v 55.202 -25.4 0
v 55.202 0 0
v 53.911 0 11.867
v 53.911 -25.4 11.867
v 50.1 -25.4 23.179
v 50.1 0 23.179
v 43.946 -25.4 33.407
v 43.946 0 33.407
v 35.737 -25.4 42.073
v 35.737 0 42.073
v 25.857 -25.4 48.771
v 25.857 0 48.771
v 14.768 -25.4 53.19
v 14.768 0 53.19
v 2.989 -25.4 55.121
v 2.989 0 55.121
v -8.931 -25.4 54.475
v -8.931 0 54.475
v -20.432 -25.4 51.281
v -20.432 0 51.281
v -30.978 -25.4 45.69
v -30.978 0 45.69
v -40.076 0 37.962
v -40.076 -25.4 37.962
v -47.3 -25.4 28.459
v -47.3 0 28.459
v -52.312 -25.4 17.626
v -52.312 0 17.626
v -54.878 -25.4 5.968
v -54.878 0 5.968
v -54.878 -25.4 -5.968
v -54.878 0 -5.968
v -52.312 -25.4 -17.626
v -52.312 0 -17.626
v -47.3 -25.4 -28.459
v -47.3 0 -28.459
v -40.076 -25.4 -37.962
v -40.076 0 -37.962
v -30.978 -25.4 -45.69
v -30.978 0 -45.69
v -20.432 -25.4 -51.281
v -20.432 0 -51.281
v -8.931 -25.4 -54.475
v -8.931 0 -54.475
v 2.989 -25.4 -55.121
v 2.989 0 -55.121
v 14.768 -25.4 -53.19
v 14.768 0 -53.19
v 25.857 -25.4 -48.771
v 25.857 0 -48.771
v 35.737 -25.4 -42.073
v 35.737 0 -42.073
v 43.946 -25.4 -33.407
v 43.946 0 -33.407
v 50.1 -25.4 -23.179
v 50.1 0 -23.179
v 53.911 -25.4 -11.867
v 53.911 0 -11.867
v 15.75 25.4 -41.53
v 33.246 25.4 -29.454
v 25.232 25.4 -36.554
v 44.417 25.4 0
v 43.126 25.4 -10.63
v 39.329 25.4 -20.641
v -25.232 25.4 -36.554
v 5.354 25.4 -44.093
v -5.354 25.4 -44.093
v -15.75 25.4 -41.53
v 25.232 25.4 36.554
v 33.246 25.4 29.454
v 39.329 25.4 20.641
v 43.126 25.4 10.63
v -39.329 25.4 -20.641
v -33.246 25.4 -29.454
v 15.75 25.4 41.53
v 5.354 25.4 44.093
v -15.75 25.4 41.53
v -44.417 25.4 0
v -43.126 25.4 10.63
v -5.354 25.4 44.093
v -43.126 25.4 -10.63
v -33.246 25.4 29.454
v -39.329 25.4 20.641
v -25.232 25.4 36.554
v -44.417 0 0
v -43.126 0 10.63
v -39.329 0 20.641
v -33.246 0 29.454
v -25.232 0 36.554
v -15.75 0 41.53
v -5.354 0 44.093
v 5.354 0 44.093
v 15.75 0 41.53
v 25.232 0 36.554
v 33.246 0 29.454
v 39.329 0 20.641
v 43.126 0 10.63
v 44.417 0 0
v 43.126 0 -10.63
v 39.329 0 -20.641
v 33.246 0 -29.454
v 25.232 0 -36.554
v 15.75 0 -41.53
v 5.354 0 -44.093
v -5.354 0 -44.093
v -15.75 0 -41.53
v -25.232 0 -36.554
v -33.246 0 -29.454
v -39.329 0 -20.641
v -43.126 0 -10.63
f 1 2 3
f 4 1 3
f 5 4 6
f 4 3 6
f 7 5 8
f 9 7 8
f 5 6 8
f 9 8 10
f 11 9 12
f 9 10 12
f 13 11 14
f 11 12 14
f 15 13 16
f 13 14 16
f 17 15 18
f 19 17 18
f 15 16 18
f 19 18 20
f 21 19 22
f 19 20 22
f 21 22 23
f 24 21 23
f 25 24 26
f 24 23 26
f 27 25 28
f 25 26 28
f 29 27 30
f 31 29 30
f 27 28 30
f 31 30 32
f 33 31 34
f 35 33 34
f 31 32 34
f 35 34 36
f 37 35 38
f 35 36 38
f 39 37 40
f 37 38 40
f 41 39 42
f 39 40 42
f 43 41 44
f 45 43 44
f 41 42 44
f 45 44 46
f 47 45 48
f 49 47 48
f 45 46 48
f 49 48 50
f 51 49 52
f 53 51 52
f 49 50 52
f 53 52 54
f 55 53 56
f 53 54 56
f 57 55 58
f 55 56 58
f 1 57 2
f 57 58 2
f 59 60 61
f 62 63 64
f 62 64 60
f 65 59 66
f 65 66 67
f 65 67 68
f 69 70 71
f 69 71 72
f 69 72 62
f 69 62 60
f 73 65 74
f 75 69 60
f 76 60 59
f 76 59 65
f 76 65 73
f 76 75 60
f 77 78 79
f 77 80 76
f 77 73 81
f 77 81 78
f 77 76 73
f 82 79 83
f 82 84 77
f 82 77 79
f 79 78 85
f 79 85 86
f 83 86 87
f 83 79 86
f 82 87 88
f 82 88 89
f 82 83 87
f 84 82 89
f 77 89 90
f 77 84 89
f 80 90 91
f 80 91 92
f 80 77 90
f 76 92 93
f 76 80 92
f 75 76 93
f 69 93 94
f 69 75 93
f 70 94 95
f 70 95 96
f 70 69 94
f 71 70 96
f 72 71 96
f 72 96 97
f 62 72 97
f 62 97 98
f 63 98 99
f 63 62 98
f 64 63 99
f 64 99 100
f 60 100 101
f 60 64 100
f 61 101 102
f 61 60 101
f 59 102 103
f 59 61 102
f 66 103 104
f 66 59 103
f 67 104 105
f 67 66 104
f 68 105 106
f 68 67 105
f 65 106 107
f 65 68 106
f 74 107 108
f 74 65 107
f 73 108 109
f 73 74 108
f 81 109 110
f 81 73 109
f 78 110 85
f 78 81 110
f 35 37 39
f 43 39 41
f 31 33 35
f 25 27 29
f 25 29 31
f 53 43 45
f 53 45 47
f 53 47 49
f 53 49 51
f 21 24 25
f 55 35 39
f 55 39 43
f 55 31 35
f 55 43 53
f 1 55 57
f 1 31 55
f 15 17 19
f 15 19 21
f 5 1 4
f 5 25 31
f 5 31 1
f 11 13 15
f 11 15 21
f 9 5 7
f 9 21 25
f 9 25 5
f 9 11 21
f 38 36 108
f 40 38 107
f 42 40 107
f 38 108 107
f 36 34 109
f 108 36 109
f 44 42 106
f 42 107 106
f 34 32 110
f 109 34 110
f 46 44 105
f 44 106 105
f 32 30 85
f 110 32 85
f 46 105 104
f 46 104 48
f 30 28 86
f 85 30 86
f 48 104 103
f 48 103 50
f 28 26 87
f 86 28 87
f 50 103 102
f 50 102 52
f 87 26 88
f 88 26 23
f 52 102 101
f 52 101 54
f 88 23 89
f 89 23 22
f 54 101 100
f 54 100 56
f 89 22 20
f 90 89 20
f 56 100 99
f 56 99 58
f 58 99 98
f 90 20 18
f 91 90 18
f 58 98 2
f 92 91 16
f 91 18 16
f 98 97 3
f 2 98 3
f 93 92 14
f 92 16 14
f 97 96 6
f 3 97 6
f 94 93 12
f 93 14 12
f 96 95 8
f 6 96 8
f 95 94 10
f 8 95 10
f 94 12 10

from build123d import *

# Parameters (mm, degrees)
F0_R     = 55.201714
F1_DEPTH = 25.4
F2_R     = 44.416682
F4_DEPTH = 25.4
F3_R     = 44.416682
F5_DEPTH = 25.4
F6_R     = 35.177102
F8_DEPTH = 50.8


with BuildPart() as f1:
    # F0 (on Front) → F1 (new body)
    with BuildSketch(Plane.XZ):
        Circle(F0_R)
    extrude(amount=F1_DEPTH)

    # F2 (on Front) → F4 (join)
    with BuildSketch(Plane.XZ):
        Circle(F2_R)
    extrude(amount=F4_DEPTH)

    # F3 (on face) → F5 (join)
    with BuildSketch(Plane(origin=(0, 25.4, 0), x_dir=(-1, 0, 0), z_dir=(0, 1, 0))):
        Circle(F3_R)
    extrude(amount=-F5_DEPTH)

    # F6 (on face) → F8 (join)
    with BuildSketch(Plane(origin=(0, 25.4, 0), x_dir=(-1, 0, 0), z_dir=(0, 1, 0))):
        Circle(F6_R)
    extrude(amount=-F8_DEPTH)


solid = f1.part
